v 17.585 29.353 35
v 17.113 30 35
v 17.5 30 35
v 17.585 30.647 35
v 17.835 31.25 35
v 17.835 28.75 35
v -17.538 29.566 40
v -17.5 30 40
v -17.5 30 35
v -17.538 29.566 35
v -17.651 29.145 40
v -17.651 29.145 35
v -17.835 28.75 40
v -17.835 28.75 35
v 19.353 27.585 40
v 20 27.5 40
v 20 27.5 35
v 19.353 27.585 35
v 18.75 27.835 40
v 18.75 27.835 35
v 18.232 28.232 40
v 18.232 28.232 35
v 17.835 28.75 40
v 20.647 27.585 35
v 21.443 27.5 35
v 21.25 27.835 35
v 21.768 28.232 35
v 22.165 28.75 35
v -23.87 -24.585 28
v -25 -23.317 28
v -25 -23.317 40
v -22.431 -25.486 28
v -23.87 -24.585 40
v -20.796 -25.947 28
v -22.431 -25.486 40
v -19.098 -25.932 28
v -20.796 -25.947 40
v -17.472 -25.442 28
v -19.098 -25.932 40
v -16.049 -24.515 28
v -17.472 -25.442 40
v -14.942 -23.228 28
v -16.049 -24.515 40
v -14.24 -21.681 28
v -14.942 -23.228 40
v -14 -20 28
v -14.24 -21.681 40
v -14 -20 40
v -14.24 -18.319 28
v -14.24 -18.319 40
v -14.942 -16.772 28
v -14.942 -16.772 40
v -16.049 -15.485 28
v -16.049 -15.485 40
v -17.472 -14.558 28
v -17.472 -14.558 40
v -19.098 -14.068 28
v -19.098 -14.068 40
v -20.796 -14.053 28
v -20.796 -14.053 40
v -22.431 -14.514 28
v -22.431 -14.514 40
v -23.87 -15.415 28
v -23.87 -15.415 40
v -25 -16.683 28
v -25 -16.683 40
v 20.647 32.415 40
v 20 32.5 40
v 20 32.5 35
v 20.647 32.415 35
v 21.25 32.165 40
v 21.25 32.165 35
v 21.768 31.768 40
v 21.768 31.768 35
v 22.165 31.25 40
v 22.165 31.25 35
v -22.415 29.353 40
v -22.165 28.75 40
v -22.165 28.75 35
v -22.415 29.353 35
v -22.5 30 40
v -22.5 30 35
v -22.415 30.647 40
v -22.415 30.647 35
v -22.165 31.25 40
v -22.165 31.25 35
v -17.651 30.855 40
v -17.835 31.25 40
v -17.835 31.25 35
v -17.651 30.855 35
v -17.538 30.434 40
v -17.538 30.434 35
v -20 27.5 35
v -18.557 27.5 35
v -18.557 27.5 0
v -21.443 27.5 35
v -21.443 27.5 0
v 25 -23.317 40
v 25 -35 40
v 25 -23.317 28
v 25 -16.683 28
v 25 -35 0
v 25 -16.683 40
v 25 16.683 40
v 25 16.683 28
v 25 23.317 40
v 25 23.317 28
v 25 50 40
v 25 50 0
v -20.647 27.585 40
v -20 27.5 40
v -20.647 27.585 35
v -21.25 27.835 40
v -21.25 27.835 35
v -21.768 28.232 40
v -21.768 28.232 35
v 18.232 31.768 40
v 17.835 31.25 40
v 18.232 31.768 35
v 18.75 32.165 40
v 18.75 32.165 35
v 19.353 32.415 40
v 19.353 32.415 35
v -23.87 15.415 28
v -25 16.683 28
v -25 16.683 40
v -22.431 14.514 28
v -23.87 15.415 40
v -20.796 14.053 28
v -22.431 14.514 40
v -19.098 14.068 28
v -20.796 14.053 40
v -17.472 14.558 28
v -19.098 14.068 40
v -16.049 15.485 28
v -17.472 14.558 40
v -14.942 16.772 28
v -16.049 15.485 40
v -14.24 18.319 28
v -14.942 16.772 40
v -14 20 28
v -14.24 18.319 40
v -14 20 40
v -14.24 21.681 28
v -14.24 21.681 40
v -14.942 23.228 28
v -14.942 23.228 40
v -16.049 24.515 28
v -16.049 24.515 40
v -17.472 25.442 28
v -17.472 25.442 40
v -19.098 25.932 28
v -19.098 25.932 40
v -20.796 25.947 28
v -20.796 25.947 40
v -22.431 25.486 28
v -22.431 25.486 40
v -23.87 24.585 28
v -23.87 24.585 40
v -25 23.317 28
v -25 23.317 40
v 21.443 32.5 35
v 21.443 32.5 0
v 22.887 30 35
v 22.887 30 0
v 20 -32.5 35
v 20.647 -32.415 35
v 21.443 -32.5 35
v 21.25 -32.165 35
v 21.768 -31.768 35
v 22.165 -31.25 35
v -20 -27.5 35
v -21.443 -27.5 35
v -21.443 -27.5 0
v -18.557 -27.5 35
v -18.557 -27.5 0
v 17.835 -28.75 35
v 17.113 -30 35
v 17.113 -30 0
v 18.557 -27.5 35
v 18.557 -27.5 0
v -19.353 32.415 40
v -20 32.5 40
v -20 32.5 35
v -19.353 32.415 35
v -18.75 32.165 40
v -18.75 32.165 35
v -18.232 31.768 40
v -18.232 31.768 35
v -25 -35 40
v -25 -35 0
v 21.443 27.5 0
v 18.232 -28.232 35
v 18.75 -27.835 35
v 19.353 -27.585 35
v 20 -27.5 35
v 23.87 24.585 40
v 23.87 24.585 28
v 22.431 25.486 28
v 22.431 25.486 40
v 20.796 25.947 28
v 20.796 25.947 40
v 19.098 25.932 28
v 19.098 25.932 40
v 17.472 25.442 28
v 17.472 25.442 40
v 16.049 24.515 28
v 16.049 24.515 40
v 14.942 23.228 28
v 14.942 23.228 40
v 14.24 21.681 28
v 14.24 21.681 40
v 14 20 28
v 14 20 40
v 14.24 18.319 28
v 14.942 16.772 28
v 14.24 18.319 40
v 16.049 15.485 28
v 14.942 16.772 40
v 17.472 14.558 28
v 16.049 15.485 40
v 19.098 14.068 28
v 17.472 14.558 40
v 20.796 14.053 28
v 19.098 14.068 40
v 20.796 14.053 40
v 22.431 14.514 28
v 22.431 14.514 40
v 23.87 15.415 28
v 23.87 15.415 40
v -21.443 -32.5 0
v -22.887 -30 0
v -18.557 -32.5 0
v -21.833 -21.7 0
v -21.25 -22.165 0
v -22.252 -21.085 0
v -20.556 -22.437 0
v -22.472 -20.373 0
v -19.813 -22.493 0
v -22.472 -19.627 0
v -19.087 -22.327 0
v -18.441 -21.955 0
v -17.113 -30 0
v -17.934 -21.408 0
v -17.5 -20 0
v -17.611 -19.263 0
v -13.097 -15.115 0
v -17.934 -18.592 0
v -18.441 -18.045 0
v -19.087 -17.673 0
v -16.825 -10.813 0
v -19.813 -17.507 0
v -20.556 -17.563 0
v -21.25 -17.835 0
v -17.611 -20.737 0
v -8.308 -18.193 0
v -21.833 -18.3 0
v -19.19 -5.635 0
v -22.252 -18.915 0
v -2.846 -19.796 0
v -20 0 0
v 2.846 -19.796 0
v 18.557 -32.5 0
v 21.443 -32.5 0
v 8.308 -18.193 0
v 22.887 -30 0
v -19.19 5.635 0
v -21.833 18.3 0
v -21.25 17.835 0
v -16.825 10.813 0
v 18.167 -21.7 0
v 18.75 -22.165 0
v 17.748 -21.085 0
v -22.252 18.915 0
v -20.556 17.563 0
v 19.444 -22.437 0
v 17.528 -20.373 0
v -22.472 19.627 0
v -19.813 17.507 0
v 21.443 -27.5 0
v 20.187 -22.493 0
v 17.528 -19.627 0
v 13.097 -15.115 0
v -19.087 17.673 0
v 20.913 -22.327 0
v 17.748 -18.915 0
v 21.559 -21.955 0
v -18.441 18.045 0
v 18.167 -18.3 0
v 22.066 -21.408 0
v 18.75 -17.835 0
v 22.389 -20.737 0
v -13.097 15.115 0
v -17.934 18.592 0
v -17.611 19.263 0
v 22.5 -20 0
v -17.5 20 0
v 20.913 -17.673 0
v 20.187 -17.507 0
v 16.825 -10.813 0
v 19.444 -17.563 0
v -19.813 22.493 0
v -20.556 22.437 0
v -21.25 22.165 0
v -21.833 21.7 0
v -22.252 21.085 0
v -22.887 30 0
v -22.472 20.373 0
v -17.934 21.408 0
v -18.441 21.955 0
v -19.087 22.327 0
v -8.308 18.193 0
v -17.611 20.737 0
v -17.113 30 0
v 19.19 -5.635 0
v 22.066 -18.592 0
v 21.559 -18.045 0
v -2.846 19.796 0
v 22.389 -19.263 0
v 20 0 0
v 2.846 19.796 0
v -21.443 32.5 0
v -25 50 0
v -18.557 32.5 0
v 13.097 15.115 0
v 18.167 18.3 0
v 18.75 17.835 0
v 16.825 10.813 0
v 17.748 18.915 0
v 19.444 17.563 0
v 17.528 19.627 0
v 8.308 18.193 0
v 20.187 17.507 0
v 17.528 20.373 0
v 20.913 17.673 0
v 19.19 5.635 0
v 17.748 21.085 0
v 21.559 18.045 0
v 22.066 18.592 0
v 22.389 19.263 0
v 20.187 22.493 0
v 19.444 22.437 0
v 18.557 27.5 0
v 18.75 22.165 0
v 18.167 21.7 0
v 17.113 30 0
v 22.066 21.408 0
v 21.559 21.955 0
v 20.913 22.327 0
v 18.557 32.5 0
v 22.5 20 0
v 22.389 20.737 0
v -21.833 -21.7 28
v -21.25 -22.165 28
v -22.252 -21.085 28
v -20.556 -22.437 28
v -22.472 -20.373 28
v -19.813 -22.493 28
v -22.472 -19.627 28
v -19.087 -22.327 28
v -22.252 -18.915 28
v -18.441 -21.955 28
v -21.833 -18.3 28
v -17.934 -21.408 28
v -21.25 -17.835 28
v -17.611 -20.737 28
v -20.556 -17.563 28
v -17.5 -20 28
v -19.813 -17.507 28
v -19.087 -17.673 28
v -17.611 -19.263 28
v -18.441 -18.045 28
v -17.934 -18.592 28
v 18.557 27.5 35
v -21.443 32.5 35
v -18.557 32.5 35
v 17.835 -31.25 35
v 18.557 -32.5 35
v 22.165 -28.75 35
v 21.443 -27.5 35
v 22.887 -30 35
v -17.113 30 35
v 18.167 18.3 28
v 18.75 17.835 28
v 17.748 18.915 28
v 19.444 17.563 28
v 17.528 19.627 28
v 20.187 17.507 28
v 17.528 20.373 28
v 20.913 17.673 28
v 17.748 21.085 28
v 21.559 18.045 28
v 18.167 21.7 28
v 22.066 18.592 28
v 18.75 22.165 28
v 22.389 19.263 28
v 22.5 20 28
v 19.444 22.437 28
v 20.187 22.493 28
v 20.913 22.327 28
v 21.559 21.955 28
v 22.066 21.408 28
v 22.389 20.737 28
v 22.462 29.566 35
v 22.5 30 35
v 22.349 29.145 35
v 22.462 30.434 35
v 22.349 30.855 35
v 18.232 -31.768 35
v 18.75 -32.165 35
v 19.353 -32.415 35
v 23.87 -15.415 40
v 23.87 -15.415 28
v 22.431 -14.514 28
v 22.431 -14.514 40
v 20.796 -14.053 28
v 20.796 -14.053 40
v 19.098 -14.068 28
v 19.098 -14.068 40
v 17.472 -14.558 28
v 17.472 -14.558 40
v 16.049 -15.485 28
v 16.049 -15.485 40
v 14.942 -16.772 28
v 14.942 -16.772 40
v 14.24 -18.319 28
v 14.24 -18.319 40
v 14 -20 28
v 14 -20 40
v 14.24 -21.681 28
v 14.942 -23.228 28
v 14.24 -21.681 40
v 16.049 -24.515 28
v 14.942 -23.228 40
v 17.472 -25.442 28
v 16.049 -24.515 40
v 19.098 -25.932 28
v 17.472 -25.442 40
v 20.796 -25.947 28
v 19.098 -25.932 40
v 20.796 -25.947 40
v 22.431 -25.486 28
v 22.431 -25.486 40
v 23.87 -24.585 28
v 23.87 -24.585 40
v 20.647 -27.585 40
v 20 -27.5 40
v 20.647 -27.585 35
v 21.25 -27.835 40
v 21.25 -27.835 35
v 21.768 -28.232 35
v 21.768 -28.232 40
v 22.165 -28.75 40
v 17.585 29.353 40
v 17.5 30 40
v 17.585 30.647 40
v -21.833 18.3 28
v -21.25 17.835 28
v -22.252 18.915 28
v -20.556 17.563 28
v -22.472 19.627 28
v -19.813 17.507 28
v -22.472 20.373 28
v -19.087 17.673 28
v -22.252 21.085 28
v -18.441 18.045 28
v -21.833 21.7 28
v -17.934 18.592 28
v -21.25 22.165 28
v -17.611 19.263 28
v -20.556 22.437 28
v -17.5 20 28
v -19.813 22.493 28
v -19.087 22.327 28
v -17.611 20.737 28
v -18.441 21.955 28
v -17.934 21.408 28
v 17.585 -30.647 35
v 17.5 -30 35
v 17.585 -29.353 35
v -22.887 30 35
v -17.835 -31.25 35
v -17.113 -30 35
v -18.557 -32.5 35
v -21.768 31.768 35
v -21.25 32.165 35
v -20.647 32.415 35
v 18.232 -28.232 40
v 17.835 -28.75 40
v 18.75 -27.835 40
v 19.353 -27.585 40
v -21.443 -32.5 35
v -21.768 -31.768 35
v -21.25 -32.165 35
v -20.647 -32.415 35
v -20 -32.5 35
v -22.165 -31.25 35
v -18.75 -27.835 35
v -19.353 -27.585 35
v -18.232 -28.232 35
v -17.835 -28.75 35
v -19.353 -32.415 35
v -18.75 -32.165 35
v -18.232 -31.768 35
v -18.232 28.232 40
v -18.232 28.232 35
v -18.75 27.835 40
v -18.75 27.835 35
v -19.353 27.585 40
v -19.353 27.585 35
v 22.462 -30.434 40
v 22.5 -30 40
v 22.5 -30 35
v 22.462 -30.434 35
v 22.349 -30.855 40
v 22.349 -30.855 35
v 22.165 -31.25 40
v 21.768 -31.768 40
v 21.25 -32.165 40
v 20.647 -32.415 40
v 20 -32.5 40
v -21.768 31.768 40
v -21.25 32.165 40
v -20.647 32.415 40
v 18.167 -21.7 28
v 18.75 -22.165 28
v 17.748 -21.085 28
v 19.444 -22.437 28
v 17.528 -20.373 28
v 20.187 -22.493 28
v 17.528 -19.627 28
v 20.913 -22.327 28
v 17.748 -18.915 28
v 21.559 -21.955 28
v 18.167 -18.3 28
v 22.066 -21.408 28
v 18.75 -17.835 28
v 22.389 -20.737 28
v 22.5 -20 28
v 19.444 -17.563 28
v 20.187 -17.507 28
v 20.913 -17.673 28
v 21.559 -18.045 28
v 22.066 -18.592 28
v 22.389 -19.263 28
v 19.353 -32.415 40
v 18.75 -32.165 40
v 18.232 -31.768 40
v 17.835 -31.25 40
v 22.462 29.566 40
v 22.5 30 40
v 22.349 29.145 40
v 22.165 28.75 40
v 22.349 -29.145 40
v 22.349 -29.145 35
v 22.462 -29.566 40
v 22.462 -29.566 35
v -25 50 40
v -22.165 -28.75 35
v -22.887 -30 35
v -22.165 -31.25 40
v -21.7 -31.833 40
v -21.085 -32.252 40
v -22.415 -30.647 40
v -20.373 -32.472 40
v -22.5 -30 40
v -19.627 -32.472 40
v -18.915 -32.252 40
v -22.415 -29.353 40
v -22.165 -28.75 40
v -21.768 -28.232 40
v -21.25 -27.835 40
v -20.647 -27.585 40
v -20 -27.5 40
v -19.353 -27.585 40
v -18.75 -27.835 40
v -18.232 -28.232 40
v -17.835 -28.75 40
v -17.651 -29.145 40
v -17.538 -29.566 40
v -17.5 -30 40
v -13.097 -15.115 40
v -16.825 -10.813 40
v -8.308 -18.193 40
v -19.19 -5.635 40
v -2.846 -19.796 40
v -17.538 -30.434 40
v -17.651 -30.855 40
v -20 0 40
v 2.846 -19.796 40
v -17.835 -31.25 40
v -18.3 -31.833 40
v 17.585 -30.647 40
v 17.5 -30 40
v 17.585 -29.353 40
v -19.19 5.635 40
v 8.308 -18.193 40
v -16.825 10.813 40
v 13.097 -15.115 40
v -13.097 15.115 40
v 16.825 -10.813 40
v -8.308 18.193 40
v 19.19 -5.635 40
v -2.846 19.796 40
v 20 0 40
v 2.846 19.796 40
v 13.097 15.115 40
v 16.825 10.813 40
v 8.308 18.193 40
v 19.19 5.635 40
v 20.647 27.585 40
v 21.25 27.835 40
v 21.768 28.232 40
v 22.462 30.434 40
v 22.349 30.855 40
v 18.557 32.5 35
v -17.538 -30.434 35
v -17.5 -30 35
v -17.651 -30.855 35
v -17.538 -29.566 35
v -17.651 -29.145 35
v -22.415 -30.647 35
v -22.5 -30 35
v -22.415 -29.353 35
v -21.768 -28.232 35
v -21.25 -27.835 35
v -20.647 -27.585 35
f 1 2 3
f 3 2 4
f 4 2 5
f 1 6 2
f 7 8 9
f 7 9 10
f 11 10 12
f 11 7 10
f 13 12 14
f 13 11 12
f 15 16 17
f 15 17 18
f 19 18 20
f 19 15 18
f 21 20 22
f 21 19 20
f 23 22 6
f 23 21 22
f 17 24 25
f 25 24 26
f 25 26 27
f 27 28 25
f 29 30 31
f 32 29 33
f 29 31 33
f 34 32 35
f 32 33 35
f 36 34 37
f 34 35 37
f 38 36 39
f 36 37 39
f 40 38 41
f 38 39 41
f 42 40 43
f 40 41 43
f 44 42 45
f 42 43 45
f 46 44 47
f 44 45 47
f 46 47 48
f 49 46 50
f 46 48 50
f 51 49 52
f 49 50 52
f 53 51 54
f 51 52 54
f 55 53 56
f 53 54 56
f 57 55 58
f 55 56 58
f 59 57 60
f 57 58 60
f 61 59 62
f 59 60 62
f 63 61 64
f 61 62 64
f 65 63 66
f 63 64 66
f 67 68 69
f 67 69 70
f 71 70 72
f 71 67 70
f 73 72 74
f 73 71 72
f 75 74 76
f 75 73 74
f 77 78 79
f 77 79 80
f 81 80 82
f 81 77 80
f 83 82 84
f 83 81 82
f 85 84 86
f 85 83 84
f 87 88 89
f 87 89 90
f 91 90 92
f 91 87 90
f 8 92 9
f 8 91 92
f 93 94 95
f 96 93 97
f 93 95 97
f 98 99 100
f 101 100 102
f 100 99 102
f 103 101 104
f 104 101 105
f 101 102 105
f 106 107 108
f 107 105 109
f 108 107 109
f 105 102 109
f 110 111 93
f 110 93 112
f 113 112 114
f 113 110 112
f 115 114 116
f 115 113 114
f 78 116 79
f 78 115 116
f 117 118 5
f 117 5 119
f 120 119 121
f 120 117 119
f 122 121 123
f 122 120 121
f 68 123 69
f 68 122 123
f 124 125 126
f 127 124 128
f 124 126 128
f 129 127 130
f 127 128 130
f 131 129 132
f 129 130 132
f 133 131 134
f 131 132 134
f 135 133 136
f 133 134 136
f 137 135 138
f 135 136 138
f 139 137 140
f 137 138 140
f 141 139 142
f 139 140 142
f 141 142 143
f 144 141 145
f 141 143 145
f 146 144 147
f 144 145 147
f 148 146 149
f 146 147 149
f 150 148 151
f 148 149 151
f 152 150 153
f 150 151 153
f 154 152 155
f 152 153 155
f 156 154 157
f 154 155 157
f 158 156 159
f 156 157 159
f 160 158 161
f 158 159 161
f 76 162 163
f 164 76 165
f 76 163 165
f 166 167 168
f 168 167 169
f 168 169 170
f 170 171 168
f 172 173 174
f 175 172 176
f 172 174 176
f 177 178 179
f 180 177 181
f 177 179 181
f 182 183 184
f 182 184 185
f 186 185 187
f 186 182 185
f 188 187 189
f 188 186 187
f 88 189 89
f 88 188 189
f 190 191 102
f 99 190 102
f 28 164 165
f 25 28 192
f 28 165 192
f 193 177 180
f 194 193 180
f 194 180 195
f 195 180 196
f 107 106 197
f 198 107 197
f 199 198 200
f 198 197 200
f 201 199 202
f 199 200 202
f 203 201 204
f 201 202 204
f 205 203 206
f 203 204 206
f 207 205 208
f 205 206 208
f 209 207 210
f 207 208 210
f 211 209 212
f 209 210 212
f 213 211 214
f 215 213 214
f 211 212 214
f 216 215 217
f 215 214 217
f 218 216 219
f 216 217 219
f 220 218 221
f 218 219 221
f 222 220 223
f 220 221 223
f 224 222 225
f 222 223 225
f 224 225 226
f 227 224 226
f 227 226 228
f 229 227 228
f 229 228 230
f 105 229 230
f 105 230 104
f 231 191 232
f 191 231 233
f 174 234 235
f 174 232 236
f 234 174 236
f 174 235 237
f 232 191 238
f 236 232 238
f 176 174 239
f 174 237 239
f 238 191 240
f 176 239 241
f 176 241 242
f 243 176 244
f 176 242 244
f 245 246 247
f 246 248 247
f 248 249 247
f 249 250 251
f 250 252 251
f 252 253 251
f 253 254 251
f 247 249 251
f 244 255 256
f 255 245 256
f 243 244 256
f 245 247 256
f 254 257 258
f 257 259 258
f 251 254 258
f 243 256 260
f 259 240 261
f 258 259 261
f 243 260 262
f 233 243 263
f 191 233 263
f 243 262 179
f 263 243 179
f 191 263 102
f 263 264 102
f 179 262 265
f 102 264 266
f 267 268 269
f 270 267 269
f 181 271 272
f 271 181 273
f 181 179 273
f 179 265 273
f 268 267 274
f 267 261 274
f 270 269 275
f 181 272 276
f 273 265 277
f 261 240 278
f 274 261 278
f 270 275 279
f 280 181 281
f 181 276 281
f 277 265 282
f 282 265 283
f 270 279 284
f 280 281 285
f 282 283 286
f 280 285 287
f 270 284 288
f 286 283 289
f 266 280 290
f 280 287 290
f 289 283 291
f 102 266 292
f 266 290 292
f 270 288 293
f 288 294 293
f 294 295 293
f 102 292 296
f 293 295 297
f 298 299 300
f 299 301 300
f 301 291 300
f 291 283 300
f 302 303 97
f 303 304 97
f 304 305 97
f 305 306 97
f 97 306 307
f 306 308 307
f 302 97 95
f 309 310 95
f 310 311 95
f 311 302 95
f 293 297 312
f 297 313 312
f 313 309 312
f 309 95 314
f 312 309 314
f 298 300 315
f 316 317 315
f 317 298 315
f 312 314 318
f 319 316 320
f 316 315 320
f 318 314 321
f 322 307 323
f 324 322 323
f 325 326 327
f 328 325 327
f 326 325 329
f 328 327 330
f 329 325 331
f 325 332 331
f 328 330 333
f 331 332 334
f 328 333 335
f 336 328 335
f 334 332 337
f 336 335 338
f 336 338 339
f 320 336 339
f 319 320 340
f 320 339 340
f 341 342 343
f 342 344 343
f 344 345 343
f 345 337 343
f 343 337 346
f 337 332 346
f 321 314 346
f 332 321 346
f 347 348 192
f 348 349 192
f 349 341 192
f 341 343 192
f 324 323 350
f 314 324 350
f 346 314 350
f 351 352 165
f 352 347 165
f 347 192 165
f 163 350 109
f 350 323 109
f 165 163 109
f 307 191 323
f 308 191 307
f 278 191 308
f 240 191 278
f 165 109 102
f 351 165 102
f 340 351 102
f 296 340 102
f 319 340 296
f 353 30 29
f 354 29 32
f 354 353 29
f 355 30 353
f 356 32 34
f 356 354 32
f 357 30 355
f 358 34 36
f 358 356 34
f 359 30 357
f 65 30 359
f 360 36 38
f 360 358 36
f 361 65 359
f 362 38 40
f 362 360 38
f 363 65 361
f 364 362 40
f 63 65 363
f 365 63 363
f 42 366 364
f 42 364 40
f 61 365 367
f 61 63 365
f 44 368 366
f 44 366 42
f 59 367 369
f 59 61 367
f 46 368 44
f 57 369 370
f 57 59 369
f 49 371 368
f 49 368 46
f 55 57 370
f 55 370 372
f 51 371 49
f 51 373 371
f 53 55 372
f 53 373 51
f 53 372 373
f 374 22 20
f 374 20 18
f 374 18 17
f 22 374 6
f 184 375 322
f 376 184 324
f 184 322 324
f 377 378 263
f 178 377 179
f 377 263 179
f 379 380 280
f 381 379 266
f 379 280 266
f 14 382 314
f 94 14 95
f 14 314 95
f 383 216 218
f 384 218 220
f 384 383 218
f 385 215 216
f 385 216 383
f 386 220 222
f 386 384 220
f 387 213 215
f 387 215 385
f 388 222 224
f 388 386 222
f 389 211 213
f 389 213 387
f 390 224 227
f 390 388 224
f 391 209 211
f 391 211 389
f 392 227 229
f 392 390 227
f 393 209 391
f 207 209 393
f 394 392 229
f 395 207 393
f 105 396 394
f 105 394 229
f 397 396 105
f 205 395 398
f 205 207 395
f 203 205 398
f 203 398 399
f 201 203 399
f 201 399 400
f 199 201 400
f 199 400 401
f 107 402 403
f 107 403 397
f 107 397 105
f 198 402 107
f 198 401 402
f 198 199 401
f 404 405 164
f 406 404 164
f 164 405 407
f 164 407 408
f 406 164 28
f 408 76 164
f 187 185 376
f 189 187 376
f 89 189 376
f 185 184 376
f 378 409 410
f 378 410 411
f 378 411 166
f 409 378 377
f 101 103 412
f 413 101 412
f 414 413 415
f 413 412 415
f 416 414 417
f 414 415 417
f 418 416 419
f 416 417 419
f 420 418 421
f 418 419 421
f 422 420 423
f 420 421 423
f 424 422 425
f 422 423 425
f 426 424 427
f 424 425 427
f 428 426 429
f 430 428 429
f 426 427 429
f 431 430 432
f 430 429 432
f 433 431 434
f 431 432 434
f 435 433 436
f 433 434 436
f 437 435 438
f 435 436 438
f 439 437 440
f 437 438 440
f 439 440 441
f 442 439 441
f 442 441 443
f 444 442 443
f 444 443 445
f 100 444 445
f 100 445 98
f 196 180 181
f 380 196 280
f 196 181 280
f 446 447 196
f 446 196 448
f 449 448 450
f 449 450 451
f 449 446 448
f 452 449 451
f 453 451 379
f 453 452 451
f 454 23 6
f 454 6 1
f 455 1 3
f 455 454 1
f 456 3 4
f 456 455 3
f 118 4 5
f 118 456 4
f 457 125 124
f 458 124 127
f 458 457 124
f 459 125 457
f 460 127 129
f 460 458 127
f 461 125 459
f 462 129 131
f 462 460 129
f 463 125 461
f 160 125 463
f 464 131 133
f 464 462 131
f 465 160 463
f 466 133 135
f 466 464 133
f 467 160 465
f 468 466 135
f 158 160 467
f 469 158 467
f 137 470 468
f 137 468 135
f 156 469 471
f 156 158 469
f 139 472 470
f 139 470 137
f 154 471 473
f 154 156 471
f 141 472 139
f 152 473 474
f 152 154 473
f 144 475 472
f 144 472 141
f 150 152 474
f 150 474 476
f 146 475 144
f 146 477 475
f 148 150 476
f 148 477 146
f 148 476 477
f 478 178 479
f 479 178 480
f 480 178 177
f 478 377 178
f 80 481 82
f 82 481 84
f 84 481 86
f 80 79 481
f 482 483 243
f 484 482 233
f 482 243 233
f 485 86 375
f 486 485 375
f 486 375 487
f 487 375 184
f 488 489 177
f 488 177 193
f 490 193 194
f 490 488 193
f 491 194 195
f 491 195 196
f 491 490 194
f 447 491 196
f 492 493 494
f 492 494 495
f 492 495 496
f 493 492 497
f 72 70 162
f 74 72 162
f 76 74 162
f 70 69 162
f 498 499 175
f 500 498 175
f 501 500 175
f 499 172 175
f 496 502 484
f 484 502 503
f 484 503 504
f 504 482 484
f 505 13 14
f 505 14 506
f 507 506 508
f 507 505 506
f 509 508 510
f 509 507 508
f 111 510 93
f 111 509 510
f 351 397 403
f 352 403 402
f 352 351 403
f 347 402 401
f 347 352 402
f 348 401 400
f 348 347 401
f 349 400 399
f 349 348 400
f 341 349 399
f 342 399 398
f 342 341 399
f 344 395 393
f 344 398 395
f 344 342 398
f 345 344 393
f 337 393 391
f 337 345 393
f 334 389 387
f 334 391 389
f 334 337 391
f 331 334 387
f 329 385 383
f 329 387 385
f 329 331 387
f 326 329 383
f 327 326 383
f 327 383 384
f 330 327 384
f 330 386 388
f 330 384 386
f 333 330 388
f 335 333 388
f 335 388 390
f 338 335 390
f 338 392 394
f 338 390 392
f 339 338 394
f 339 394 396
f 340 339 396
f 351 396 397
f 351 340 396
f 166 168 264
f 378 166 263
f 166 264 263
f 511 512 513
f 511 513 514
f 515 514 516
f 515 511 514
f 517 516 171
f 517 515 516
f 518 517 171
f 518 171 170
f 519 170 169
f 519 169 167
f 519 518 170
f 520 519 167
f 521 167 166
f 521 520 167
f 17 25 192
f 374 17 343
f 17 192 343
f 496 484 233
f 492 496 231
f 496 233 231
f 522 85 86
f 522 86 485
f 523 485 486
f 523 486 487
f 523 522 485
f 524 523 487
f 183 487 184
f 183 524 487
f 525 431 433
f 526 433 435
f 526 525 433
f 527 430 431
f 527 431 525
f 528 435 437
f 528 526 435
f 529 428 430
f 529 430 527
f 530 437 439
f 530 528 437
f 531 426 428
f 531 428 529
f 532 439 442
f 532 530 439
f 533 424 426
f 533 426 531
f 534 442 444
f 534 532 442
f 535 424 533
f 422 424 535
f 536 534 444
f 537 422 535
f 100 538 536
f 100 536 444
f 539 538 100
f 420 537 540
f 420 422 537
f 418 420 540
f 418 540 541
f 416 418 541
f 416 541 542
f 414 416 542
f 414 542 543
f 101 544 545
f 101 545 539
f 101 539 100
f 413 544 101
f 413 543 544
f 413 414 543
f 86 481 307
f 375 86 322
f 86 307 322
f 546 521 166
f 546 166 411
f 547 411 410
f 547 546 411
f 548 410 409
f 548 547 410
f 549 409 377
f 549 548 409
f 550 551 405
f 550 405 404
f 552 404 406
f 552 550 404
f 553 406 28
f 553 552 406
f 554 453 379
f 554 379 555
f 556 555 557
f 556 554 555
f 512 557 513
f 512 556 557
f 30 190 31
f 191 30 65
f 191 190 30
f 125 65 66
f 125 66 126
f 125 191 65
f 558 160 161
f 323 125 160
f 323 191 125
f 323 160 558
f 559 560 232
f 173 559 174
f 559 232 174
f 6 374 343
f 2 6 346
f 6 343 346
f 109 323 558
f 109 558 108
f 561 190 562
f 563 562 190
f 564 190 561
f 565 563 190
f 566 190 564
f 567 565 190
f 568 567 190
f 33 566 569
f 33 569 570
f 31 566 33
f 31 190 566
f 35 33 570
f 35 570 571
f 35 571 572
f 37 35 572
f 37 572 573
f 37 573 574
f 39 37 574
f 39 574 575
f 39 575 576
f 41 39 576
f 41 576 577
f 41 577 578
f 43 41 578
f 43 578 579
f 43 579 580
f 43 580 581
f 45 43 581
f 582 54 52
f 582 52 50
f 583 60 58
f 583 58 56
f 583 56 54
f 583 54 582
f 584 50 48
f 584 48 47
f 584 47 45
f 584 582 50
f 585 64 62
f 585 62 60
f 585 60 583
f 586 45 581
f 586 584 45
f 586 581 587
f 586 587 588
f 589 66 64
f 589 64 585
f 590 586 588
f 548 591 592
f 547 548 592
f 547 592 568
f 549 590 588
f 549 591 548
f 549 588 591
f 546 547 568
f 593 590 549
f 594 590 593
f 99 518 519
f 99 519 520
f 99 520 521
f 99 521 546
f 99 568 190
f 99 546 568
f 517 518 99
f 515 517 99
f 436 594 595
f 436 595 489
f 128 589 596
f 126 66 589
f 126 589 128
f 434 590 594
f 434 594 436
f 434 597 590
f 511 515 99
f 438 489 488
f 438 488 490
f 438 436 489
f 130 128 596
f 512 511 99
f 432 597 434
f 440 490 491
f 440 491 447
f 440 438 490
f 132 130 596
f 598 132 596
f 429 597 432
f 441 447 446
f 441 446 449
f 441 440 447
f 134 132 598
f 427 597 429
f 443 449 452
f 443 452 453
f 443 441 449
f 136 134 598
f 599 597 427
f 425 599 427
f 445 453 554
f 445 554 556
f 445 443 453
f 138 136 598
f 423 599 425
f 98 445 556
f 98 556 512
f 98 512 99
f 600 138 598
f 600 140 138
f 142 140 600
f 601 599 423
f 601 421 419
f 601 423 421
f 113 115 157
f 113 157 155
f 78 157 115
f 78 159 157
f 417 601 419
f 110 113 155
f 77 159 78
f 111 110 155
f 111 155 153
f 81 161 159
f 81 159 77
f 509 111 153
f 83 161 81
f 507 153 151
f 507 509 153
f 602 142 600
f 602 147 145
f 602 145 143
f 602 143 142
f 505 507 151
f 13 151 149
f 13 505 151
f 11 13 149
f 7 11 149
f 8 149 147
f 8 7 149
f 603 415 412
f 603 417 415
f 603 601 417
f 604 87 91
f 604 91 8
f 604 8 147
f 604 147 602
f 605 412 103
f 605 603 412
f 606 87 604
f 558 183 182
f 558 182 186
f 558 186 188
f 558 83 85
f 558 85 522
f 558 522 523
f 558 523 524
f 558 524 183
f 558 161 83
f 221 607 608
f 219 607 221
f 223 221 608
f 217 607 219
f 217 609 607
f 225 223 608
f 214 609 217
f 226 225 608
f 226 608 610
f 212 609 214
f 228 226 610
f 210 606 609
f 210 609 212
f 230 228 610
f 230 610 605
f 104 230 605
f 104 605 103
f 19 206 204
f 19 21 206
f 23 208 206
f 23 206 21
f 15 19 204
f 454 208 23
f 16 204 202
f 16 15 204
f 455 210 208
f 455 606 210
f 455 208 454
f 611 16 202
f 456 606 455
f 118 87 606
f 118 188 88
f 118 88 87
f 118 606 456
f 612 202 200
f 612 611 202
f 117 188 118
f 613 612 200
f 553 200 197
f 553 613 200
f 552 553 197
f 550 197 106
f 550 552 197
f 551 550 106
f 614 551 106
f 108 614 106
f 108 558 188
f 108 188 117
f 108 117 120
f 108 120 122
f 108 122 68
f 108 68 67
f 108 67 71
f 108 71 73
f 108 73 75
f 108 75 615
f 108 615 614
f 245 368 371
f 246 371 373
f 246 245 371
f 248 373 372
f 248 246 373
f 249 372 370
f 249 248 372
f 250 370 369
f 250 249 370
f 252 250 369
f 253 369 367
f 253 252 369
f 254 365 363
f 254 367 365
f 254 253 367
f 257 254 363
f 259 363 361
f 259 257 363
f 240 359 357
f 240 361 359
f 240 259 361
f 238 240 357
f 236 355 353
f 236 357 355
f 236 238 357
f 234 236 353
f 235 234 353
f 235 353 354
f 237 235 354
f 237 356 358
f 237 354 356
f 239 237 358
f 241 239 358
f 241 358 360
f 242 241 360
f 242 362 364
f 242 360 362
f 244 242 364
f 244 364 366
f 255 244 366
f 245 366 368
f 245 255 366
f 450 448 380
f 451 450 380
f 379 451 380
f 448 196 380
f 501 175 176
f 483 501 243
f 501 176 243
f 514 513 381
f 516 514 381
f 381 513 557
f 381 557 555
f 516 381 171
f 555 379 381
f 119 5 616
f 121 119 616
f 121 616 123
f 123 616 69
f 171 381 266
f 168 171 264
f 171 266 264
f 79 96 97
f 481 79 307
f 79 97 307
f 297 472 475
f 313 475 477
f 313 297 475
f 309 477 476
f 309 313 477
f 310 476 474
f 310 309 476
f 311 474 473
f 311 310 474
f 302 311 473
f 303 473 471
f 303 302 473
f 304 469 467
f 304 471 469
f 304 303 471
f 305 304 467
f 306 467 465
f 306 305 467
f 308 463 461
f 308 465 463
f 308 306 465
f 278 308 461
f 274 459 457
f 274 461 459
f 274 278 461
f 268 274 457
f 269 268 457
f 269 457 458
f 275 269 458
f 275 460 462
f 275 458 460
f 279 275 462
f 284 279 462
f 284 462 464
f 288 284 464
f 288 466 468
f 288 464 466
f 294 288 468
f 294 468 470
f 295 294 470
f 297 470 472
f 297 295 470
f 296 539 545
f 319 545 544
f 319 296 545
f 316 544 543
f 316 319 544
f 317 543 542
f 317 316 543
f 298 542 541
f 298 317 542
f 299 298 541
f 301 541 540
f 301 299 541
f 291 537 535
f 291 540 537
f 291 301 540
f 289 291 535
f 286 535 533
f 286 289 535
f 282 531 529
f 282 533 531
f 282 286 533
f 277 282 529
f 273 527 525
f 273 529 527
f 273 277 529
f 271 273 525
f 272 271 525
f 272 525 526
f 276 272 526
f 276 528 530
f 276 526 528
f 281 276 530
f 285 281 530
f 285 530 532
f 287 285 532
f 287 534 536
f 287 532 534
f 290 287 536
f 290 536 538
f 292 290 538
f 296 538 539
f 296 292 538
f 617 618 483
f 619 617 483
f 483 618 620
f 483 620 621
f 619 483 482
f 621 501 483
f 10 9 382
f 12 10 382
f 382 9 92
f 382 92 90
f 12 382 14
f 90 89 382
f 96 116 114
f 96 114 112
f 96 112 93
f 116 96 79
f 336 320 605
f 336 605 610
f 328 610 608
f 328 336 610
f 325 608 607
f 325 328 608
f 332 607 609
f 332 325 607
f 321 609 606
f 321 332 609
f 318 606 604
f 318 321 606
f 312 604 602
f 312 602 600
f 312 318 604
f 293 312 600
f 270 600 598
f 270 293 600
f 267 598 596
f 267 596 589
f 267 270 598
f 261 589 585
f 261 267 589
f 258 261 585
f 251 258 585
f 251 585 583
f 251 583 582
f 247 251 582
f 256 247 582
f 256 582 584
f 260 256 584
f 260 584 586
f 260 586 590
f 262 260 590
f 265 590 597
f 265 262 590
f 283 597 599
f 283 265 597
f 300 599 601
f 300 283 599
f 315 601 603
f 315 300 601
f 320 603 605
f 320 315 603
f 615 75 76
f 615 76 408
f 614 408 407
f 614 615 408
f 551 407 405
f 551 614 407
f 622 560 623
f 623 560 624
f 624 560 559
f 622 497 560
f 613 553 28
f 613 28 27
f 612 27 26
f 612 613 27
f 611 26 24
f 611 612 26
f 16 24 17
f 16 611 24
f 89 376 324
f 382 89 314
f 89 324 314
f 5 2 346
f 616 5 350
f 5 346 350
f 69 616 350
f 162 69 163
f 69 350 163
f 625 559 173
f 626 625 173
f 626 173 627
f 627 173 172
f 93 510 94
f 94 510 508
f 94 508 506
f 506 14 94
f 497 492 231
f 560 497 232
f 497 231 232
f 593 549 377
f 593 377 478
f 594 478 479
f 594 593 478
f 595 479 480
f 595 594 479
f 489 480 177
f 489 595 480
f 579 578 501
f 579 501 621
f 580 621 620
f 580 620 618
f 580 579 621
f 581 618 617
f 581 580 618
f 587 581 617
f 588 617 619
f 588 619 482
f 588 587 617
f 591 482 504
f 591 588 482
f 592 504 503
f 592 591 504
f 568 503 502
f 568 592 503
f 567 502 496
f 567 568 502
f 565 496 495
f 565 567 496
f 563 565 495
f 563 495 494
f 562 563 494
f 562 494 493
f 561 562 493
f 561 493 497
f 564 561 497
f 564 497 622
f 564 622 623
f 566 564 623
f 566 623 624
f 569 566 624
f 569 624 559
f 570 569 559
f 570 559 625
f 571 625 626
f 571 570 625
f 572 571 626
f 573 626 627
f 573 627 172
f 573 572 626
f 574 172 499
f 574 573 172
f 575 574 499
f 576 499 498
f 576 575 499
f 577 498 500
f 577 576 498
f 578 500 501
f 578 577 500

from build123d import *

# Parameters (mm, degrees)
F0_W     = 50
F0_H     = 85
F0_R     = 2.5
F0_R_2   = 20
F1_DEPTH = 40
F3_DEPTH = 5
F4_R     = 6
F5_DEPTH = 12


with BuildPart() as f1:
    # F0 (on Top) → F1 (new body)
    with BuildSketch(Plane.XY):
        with Locations((0, 7.5)):
            Rectangle(F0_W, F0_H)
        Polygon((-21.443375673, -27.5), (-18.556624327, -27.5), (-17.1132486541, -30), (-18.556624327, -32.5), (-21.443375673, -32.5), (-22.8867513459, -30), align=None, mode=Mode.SUBTRACT)
        with Locations((-20, -20)):
            Circle(F0_R, mode=Mode.SUBTRACT)
        Polygon((18.556624327, -32.5), (17.1132486541, -30), (18.556624327, -27.5), (21.443375673, -27.5), (22.8867513459, -30), (21.443375673, -32.5), align=None, mode=Mode.SUBTRACT)
        with Locations((20, -20)):
            Circle(F0_R, mode=Mode.SUBTRACT)
        Circle(F0_R_2, mode=Mode.SUBTRACT)
        with Locations((-20, 20)):
            Circle(F0_R, mode=Mode.SUBTRACT)
        Polygon((-18.556624327, 27.5), (-21.443375673, 27.5), (-22.8867513459, 30), (-21.443375673, 32.5), (-18.556624327, 32.5), (-17.1132486541, 30), align=None, mode=Mode.SUBTRACT)
        with Locations((20, 20)):
            Circle(F0_R, mode=Mode.SUBTRACT)
        Polygon((21.443375673, 27.5), (18.556624327, 27.5), (17.1132486541, 30), (18.556624327, 32.5), (21.443375673, 32.5), (22.8867513459, 30), align=None, mode=Mode.SUBTRACT)
    extrude(amount=F1_DEPTH)

    # F2 (on face) → F3 (join)
    with BuildSketch(Plane.XY.offset(40)):
        with BuildLine():
            ThreePointArc((-20, 32.5), (-18.7499999704, 32.1650634924), (-17.8349364564, 31.2499999408))
            Line((-17.8349364564, 31.2499999408), (-18.556624327, 32.5))
            Line((-18.556624327, 32.5), (-20, 32.5))
        make_face()
        with BuildLine():
            ThreePointArc((-22.1650634864, 31.25000004), (-21.24999998, 32.165063521), (-20, 32.5))
            Line((-20, 32.5), (-21.443375673, 32.5))
            Line((-21.443375673, 32.5), (-22.1650634864, 31.25000004))
        make_face()
        with BuildLine():
            ThreePointArc((-22.1650635259, 28.7500000285), (-22.5, 30.0000000396), (-22.1650634864, 31.25000004))
            Line((-22.1650634864, 31.25000004), (-22.8867513459, 30))
            Line((-22.8867513459, 30), (-22.1650635259, 28.7500000285))
        make_face()
        with BuildLine():
            Line((-21.443375673, 27.5), (-20, 27.5))
            ThreePointArc((-20, 27.5), (-21.2500000143, 27.8349364988), (-22.1650635259, 28.7500000285))
            Line((-22.1650635259, 28.7500000285), (-21.443375673, 27.5))
        make_face()
        with BuildLine():
            Line((-18.556624327, 27.5), (-17.8349364673, 28.7500000402))
            ThreePointArc((-17.8349364673, 28.7500000402), (-18.7499999799, 27.8349365022), (-20, 27.5))
            Line((-20, 27.5), (-18.556624327, 27.5))
        make_face()
        with BuildLine():
            ThreePointArc((-17.8349364564, 31.2499999408), (-17.5851854254, 30.6470475798), (-17.5, 30))
            ThreePointArc((-17.5, 30), (-17.5851854283, 29.3529524097), (-17.8349364673, 28.7500000402))
            Line((-17.8349364673, 28.7500000402), (-17.1132486541, 30))
            Line((-17.1132486541, 30), (-17.8349364564, 31.2499999408))
        make_face()
        with BuildLine():
            ThreePointArc((17.8349364866, 31.2499999932), (18.7499999966, 32.1650635075), (20, 32.5))
            Line((20, 32.5), (18.556624327, 32.5))
            Line((18.556624327, 32.5), (17.8349364866, 31.2499999932))
        make_face()
        with BuildLine():
            ThreePointArc((20, 32.5), (21.2499999895, 32.1650635155), (22.1650634973, 31.2500000211))
            Line((22.1650634973, 31.2500000211), (21.443375673, 32.5))
            Line((21.443375673, 32.5), (20, 32.5))
        make_face()
        with BuildLine():
            ThreePointArc((22.1650634973, 31.2500000211), (22.4148145626, 30.6470476245), (22.5, 30))
            ThreePointArc((22.5, 30), (22.41481457, 29.3529524032), (22.1650635259, 28.7500000285))
            Line((22.1650635259, 28.7500000285), (22.8867513459, 30))
            Line((22.8867513459, 30), (22.1650634973, 31.2500000211))
        make_face()
        with BuildLine():
            Line((21.443375673, 27.5), (22.1650635259, 28.7500000285))
            ThreePointArc((22.1650635259, 28.7500000285), (21.2500000143, 27.8349364988), (20, 27.5))
            Line((20, 27.5), (21.443375673, 27.5))
        make_face()
        with BuildLine():
            Line((18.556624327, 27.5), (20, 27.5))
            ThreePointArc((20, 27.5), (18.7499999704, 27.8349365076), (17.8349364564, 28.7500000592))
            Line((17.8349364564, 28.7500000592), (18.556624327, 27.5))
        make_face()
        with BuildLine():
            ThreePointArc((17.8349364564, 28.7500000592), (17.5, 30.0000000302), (17.8349364866, 31.2499999932))
            Line((17.8349364866, 31.2499999932), (17.1132486541, 30))
            Line((17.1132486541, 30), (17.8349364564, 28.7500000592))
        make_face()
        with BuildLine():
            Line((18.556624327, -32.5), (20, -32.5))
            ThreePointArc((20, -32.5), (18.7499999704, -32.1650634924), (17.8349364564, -31.2499999408))
            Line((17.8349364564, -31.2499999408), (18.556624327, -32.5))
        make_face()
        with BuildLine():
            Line((21.443375673, -32.5), (22.1650634973, -31.2500000211))
            ThreePointArc((22.1650634973, -31.2500000211), (21.2499999895, -32.1650635155), (20, -32.5))
            Line((20, -32.5), (21.443375673, -32.5))
        make_face()
        with BuildLine():
            ThreePointArc((22.1650635285, -28.750000033), (22.4148145707, -29.3529524056), (22.5, -30))
            ThreePointArc((22.5, -30), (22.4148145626, -30.6470476245), (22.1650634973, -31.2500000211))
            Line((22.1650634973, -31.2500000211), (22.8867513459, -30))
            Line((22.8867513459, -30), (22.1650635285, -28.750000033))
        make_face()
        with BuildLine():
            ThreePointArc((20, -27.5), (21.2500000165, -27.8349365001), (22.1650635285, -28.750000033))
            Line((22.1650635285, -28.750000033), (21.443375673, -27.5))
            Line((21.443375673, -27.5), (20, -27.5))
        make_face()
        with BuildLine():
            ThreePointArc((17.8349364802, -28.7500000179), (18.7499999911, -27.8349364957), (20, -27.5))
            Line((20, -27.5), (18.556624327, -27.5))
            Line((18.556624327, -27.5), (17.8349364802, -28.7500000179))
        make_face()
        with BuildLine():
            ThreePointArc((17.8349364564, -31.2499999408), (17.5, -29.9999999762), (17.8349364802, -28.7500000179))
            Line((17.8349364802, -28.7500000179), (17.1132486541, -30))
            Line((17.1132486541, -30), (17.8349364564, -31.2499999408))
        make_face()
        with BuildLine():
            Line((-18.556624327, -32.5), (-17.8349364564, -31.2499999408))
            ThreePointArc((-17.8349364564, -31.2499999408), (-18.7499999704, -32.1650634924), (-20, -32.5))
            Line((-20, -32.5), (-18.556624327, -32.5))
        make_face()
        with BuildLine():
            Line((-21.443375673, -32.5), (-20, -32.5))
            ThreePointArc((-20, -32.5), (-21.2499999493, -32.1650635387), (-22.165063451, -31.2500001013))
            Line((-22.165063451, -31.2500001013), (-21.443375673, -32.5))
        make_face()
        with BuildLine():
            ThreePointArc((-22.165063451, -31.2500001013), (-22.5, -30.000000064), (-22.165063515, -28.7500000096))
            Line((-22.165063515, -28.7500000096), (-22.8867513459, -30))
            Line((-22.8867513459, -30), (-22.165063451, -31.2500001013))
        make_face()
        with BuildLine():
            ThreePointArc((-22.165063515, -28.7500000096), (-21.2500000048, -27.8349364933), (-20, -27.5))
            Line((-20, -27.5), (-21.443375673, -27.5))
            Line((-21.443375673, -27.5), (-22.165063515, -28.7500000096))
        make_face()
        with BuildLine():
            ThreePointArc((-20, -27.5), (-18.7499999704, -27.8349365076), (-17.8349364564, -28.7500000592))
            Line((-17.8349364564, -28.7500000592), (-18.556624327, -27.5))
            Line((-18.556624327, -27.5), (-20, -27.5))
        make_face()
        with BuildLine():
            ThreePointArc((-17.8349364564, -28.7500000592), (-17.5851854254, -29.3529524202), (-17.5, -30))
            ThreePointArc((-17.5, -30), (-17.5851854254, -30.6470475798), (-17.8349364564, -31.2499999408))
            Line((-17.8349364564, -31.2499999408), (-17.1132486541, -30))
            Line((-17.1132486541, -30), (-17.8349364564, -28.7500000592))
        make_face()
    extrude(amount=-F3_DEPTH)

    # F4 (on face) → F5 (cut)
    with BuildSketch(Plane.XY.offset(40)):
        with Locations((-20, -20)):
            Circle(F4_R)
        with Locations((20, -20)):
            Circle(F4_R)
        with Locations((-20, 20)):
            Circle(F4_R)
        with Locations((20, 20)):
            Circle(F4_R)
    extrude(amount=-F5_DEPTH, mode=Mode.SUBTRACT)


solid = f1.part
